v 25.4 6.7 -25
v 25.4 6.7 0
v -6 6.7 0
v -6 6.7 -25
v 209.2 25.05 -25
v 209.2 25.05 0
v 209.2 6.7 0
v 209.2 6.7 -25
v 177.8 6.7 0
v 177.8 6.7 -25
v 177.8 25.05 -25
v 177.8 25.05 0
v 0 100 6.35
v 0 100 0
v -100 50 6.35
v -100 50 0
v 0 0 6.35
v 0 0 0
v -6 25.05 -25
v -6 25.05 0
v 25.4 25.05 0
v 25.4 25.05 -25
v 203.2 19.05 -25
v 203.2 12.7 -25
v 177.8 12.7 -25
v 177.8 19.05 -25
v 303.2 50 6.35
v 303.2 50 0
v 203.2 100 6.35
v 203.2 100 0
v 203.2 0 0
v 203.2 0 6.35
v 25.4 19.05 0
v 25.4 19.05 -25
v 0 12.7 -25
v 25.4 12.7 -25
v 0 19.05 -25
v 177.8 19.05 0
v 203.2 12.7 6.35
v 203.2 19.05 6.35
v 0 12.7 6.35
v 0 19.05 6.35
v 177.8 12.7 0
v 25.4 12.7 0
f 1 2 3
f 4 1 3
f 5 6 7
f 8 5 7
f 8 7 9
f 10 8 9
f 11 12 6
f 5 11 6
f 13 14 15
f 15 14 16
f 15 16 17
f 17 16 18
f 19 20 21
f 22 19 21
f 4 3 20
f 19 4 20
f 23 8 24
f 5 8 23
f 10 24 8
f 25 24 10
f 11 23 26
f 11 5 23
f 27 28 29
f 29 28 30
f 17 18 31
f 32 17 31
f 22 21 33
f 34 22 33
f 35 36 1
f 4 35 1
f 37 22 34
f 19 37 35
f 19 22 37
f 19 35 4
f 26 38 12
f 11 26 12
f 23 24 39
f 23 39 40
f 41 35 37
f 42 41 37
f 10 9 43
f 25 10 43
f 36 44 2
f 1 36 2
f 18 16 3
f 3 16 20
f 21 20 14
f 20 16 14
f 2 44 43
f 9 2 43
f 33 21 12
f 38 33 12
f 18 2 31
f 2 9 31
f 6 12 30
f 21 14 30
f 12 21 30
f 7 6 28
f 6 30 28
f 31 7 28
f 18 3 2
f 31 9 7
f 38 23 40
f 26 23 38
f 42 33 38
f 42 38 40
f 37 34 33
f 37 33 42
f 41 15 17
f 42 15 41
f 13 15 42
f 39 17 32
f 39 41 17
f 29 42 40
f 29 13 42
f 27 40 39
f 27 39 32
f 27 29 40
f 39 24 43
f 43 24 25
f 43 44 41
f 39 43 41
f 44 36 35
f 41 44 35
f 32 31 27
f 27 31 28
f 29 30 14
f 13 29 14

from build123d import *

# Parameters (mm, degrees)
BOSS_EXTRUDE1_DEPTH = 6.35
BOSS_EXTRUDE3_DEPTH = 25
SKETCH3_W           = 203.2
SKETCH3_H           = 6.35
CUT_EXTRUDE1_DEPTH  = 10


with BuildPart() as part:
    # Sketch1 → Boss-Extrude1 (new body)
    with BuildSketch(Plane.XY):
        Polygon((0, 0), (203.2, 0), (303.2, 50), (203.2, 100), (0, 100), (-100, 50), align=None)
    extrude(amount=BOSS_EXTRUDE1_DEPTH)

    # Sketch2 → Boss-Extrude3 (add)
    with BuildSketch(Plane(origin=(0, 0, 0), x_dir=(-1, 0, 0), z_dir=(0, 0, -1))):
        Polygon((-177.8, 12.7), (-203.2, 12.7), (-203.2, 19.05), (-177.8, 19.05), (-177.8, 25.05), (-209.2, 25.05), (-209.2, 6.7), (-177.8, 6.7), align=None)
        Polygon((6, 6.7), (6, 25.05), (-25.4, 25.05), (-25.4, 19.05), (0, 19.05), (0, 12.7), (-25.4, 12.7), (-25.4, 6.7), align=None)
    extrude(amount=BOSS_EXTRUDE3_DEPTH)

    # Sketch3 → Cut-Extrude1 (cut)
    with BuildSketch(Plane(origin=(0, 0, 0), x_dir=(-1, 0, 0), z_dir=(0, 0, -1))):
        with Locations((-101.6, 15.875)):
            Rectangle(SKETCH3_W, SKETCH3_H)
    extrude(amount=-CUT_EXTRUDE1_DEPTH, mode=Mode.SUBTRACT)


solid = part.part
